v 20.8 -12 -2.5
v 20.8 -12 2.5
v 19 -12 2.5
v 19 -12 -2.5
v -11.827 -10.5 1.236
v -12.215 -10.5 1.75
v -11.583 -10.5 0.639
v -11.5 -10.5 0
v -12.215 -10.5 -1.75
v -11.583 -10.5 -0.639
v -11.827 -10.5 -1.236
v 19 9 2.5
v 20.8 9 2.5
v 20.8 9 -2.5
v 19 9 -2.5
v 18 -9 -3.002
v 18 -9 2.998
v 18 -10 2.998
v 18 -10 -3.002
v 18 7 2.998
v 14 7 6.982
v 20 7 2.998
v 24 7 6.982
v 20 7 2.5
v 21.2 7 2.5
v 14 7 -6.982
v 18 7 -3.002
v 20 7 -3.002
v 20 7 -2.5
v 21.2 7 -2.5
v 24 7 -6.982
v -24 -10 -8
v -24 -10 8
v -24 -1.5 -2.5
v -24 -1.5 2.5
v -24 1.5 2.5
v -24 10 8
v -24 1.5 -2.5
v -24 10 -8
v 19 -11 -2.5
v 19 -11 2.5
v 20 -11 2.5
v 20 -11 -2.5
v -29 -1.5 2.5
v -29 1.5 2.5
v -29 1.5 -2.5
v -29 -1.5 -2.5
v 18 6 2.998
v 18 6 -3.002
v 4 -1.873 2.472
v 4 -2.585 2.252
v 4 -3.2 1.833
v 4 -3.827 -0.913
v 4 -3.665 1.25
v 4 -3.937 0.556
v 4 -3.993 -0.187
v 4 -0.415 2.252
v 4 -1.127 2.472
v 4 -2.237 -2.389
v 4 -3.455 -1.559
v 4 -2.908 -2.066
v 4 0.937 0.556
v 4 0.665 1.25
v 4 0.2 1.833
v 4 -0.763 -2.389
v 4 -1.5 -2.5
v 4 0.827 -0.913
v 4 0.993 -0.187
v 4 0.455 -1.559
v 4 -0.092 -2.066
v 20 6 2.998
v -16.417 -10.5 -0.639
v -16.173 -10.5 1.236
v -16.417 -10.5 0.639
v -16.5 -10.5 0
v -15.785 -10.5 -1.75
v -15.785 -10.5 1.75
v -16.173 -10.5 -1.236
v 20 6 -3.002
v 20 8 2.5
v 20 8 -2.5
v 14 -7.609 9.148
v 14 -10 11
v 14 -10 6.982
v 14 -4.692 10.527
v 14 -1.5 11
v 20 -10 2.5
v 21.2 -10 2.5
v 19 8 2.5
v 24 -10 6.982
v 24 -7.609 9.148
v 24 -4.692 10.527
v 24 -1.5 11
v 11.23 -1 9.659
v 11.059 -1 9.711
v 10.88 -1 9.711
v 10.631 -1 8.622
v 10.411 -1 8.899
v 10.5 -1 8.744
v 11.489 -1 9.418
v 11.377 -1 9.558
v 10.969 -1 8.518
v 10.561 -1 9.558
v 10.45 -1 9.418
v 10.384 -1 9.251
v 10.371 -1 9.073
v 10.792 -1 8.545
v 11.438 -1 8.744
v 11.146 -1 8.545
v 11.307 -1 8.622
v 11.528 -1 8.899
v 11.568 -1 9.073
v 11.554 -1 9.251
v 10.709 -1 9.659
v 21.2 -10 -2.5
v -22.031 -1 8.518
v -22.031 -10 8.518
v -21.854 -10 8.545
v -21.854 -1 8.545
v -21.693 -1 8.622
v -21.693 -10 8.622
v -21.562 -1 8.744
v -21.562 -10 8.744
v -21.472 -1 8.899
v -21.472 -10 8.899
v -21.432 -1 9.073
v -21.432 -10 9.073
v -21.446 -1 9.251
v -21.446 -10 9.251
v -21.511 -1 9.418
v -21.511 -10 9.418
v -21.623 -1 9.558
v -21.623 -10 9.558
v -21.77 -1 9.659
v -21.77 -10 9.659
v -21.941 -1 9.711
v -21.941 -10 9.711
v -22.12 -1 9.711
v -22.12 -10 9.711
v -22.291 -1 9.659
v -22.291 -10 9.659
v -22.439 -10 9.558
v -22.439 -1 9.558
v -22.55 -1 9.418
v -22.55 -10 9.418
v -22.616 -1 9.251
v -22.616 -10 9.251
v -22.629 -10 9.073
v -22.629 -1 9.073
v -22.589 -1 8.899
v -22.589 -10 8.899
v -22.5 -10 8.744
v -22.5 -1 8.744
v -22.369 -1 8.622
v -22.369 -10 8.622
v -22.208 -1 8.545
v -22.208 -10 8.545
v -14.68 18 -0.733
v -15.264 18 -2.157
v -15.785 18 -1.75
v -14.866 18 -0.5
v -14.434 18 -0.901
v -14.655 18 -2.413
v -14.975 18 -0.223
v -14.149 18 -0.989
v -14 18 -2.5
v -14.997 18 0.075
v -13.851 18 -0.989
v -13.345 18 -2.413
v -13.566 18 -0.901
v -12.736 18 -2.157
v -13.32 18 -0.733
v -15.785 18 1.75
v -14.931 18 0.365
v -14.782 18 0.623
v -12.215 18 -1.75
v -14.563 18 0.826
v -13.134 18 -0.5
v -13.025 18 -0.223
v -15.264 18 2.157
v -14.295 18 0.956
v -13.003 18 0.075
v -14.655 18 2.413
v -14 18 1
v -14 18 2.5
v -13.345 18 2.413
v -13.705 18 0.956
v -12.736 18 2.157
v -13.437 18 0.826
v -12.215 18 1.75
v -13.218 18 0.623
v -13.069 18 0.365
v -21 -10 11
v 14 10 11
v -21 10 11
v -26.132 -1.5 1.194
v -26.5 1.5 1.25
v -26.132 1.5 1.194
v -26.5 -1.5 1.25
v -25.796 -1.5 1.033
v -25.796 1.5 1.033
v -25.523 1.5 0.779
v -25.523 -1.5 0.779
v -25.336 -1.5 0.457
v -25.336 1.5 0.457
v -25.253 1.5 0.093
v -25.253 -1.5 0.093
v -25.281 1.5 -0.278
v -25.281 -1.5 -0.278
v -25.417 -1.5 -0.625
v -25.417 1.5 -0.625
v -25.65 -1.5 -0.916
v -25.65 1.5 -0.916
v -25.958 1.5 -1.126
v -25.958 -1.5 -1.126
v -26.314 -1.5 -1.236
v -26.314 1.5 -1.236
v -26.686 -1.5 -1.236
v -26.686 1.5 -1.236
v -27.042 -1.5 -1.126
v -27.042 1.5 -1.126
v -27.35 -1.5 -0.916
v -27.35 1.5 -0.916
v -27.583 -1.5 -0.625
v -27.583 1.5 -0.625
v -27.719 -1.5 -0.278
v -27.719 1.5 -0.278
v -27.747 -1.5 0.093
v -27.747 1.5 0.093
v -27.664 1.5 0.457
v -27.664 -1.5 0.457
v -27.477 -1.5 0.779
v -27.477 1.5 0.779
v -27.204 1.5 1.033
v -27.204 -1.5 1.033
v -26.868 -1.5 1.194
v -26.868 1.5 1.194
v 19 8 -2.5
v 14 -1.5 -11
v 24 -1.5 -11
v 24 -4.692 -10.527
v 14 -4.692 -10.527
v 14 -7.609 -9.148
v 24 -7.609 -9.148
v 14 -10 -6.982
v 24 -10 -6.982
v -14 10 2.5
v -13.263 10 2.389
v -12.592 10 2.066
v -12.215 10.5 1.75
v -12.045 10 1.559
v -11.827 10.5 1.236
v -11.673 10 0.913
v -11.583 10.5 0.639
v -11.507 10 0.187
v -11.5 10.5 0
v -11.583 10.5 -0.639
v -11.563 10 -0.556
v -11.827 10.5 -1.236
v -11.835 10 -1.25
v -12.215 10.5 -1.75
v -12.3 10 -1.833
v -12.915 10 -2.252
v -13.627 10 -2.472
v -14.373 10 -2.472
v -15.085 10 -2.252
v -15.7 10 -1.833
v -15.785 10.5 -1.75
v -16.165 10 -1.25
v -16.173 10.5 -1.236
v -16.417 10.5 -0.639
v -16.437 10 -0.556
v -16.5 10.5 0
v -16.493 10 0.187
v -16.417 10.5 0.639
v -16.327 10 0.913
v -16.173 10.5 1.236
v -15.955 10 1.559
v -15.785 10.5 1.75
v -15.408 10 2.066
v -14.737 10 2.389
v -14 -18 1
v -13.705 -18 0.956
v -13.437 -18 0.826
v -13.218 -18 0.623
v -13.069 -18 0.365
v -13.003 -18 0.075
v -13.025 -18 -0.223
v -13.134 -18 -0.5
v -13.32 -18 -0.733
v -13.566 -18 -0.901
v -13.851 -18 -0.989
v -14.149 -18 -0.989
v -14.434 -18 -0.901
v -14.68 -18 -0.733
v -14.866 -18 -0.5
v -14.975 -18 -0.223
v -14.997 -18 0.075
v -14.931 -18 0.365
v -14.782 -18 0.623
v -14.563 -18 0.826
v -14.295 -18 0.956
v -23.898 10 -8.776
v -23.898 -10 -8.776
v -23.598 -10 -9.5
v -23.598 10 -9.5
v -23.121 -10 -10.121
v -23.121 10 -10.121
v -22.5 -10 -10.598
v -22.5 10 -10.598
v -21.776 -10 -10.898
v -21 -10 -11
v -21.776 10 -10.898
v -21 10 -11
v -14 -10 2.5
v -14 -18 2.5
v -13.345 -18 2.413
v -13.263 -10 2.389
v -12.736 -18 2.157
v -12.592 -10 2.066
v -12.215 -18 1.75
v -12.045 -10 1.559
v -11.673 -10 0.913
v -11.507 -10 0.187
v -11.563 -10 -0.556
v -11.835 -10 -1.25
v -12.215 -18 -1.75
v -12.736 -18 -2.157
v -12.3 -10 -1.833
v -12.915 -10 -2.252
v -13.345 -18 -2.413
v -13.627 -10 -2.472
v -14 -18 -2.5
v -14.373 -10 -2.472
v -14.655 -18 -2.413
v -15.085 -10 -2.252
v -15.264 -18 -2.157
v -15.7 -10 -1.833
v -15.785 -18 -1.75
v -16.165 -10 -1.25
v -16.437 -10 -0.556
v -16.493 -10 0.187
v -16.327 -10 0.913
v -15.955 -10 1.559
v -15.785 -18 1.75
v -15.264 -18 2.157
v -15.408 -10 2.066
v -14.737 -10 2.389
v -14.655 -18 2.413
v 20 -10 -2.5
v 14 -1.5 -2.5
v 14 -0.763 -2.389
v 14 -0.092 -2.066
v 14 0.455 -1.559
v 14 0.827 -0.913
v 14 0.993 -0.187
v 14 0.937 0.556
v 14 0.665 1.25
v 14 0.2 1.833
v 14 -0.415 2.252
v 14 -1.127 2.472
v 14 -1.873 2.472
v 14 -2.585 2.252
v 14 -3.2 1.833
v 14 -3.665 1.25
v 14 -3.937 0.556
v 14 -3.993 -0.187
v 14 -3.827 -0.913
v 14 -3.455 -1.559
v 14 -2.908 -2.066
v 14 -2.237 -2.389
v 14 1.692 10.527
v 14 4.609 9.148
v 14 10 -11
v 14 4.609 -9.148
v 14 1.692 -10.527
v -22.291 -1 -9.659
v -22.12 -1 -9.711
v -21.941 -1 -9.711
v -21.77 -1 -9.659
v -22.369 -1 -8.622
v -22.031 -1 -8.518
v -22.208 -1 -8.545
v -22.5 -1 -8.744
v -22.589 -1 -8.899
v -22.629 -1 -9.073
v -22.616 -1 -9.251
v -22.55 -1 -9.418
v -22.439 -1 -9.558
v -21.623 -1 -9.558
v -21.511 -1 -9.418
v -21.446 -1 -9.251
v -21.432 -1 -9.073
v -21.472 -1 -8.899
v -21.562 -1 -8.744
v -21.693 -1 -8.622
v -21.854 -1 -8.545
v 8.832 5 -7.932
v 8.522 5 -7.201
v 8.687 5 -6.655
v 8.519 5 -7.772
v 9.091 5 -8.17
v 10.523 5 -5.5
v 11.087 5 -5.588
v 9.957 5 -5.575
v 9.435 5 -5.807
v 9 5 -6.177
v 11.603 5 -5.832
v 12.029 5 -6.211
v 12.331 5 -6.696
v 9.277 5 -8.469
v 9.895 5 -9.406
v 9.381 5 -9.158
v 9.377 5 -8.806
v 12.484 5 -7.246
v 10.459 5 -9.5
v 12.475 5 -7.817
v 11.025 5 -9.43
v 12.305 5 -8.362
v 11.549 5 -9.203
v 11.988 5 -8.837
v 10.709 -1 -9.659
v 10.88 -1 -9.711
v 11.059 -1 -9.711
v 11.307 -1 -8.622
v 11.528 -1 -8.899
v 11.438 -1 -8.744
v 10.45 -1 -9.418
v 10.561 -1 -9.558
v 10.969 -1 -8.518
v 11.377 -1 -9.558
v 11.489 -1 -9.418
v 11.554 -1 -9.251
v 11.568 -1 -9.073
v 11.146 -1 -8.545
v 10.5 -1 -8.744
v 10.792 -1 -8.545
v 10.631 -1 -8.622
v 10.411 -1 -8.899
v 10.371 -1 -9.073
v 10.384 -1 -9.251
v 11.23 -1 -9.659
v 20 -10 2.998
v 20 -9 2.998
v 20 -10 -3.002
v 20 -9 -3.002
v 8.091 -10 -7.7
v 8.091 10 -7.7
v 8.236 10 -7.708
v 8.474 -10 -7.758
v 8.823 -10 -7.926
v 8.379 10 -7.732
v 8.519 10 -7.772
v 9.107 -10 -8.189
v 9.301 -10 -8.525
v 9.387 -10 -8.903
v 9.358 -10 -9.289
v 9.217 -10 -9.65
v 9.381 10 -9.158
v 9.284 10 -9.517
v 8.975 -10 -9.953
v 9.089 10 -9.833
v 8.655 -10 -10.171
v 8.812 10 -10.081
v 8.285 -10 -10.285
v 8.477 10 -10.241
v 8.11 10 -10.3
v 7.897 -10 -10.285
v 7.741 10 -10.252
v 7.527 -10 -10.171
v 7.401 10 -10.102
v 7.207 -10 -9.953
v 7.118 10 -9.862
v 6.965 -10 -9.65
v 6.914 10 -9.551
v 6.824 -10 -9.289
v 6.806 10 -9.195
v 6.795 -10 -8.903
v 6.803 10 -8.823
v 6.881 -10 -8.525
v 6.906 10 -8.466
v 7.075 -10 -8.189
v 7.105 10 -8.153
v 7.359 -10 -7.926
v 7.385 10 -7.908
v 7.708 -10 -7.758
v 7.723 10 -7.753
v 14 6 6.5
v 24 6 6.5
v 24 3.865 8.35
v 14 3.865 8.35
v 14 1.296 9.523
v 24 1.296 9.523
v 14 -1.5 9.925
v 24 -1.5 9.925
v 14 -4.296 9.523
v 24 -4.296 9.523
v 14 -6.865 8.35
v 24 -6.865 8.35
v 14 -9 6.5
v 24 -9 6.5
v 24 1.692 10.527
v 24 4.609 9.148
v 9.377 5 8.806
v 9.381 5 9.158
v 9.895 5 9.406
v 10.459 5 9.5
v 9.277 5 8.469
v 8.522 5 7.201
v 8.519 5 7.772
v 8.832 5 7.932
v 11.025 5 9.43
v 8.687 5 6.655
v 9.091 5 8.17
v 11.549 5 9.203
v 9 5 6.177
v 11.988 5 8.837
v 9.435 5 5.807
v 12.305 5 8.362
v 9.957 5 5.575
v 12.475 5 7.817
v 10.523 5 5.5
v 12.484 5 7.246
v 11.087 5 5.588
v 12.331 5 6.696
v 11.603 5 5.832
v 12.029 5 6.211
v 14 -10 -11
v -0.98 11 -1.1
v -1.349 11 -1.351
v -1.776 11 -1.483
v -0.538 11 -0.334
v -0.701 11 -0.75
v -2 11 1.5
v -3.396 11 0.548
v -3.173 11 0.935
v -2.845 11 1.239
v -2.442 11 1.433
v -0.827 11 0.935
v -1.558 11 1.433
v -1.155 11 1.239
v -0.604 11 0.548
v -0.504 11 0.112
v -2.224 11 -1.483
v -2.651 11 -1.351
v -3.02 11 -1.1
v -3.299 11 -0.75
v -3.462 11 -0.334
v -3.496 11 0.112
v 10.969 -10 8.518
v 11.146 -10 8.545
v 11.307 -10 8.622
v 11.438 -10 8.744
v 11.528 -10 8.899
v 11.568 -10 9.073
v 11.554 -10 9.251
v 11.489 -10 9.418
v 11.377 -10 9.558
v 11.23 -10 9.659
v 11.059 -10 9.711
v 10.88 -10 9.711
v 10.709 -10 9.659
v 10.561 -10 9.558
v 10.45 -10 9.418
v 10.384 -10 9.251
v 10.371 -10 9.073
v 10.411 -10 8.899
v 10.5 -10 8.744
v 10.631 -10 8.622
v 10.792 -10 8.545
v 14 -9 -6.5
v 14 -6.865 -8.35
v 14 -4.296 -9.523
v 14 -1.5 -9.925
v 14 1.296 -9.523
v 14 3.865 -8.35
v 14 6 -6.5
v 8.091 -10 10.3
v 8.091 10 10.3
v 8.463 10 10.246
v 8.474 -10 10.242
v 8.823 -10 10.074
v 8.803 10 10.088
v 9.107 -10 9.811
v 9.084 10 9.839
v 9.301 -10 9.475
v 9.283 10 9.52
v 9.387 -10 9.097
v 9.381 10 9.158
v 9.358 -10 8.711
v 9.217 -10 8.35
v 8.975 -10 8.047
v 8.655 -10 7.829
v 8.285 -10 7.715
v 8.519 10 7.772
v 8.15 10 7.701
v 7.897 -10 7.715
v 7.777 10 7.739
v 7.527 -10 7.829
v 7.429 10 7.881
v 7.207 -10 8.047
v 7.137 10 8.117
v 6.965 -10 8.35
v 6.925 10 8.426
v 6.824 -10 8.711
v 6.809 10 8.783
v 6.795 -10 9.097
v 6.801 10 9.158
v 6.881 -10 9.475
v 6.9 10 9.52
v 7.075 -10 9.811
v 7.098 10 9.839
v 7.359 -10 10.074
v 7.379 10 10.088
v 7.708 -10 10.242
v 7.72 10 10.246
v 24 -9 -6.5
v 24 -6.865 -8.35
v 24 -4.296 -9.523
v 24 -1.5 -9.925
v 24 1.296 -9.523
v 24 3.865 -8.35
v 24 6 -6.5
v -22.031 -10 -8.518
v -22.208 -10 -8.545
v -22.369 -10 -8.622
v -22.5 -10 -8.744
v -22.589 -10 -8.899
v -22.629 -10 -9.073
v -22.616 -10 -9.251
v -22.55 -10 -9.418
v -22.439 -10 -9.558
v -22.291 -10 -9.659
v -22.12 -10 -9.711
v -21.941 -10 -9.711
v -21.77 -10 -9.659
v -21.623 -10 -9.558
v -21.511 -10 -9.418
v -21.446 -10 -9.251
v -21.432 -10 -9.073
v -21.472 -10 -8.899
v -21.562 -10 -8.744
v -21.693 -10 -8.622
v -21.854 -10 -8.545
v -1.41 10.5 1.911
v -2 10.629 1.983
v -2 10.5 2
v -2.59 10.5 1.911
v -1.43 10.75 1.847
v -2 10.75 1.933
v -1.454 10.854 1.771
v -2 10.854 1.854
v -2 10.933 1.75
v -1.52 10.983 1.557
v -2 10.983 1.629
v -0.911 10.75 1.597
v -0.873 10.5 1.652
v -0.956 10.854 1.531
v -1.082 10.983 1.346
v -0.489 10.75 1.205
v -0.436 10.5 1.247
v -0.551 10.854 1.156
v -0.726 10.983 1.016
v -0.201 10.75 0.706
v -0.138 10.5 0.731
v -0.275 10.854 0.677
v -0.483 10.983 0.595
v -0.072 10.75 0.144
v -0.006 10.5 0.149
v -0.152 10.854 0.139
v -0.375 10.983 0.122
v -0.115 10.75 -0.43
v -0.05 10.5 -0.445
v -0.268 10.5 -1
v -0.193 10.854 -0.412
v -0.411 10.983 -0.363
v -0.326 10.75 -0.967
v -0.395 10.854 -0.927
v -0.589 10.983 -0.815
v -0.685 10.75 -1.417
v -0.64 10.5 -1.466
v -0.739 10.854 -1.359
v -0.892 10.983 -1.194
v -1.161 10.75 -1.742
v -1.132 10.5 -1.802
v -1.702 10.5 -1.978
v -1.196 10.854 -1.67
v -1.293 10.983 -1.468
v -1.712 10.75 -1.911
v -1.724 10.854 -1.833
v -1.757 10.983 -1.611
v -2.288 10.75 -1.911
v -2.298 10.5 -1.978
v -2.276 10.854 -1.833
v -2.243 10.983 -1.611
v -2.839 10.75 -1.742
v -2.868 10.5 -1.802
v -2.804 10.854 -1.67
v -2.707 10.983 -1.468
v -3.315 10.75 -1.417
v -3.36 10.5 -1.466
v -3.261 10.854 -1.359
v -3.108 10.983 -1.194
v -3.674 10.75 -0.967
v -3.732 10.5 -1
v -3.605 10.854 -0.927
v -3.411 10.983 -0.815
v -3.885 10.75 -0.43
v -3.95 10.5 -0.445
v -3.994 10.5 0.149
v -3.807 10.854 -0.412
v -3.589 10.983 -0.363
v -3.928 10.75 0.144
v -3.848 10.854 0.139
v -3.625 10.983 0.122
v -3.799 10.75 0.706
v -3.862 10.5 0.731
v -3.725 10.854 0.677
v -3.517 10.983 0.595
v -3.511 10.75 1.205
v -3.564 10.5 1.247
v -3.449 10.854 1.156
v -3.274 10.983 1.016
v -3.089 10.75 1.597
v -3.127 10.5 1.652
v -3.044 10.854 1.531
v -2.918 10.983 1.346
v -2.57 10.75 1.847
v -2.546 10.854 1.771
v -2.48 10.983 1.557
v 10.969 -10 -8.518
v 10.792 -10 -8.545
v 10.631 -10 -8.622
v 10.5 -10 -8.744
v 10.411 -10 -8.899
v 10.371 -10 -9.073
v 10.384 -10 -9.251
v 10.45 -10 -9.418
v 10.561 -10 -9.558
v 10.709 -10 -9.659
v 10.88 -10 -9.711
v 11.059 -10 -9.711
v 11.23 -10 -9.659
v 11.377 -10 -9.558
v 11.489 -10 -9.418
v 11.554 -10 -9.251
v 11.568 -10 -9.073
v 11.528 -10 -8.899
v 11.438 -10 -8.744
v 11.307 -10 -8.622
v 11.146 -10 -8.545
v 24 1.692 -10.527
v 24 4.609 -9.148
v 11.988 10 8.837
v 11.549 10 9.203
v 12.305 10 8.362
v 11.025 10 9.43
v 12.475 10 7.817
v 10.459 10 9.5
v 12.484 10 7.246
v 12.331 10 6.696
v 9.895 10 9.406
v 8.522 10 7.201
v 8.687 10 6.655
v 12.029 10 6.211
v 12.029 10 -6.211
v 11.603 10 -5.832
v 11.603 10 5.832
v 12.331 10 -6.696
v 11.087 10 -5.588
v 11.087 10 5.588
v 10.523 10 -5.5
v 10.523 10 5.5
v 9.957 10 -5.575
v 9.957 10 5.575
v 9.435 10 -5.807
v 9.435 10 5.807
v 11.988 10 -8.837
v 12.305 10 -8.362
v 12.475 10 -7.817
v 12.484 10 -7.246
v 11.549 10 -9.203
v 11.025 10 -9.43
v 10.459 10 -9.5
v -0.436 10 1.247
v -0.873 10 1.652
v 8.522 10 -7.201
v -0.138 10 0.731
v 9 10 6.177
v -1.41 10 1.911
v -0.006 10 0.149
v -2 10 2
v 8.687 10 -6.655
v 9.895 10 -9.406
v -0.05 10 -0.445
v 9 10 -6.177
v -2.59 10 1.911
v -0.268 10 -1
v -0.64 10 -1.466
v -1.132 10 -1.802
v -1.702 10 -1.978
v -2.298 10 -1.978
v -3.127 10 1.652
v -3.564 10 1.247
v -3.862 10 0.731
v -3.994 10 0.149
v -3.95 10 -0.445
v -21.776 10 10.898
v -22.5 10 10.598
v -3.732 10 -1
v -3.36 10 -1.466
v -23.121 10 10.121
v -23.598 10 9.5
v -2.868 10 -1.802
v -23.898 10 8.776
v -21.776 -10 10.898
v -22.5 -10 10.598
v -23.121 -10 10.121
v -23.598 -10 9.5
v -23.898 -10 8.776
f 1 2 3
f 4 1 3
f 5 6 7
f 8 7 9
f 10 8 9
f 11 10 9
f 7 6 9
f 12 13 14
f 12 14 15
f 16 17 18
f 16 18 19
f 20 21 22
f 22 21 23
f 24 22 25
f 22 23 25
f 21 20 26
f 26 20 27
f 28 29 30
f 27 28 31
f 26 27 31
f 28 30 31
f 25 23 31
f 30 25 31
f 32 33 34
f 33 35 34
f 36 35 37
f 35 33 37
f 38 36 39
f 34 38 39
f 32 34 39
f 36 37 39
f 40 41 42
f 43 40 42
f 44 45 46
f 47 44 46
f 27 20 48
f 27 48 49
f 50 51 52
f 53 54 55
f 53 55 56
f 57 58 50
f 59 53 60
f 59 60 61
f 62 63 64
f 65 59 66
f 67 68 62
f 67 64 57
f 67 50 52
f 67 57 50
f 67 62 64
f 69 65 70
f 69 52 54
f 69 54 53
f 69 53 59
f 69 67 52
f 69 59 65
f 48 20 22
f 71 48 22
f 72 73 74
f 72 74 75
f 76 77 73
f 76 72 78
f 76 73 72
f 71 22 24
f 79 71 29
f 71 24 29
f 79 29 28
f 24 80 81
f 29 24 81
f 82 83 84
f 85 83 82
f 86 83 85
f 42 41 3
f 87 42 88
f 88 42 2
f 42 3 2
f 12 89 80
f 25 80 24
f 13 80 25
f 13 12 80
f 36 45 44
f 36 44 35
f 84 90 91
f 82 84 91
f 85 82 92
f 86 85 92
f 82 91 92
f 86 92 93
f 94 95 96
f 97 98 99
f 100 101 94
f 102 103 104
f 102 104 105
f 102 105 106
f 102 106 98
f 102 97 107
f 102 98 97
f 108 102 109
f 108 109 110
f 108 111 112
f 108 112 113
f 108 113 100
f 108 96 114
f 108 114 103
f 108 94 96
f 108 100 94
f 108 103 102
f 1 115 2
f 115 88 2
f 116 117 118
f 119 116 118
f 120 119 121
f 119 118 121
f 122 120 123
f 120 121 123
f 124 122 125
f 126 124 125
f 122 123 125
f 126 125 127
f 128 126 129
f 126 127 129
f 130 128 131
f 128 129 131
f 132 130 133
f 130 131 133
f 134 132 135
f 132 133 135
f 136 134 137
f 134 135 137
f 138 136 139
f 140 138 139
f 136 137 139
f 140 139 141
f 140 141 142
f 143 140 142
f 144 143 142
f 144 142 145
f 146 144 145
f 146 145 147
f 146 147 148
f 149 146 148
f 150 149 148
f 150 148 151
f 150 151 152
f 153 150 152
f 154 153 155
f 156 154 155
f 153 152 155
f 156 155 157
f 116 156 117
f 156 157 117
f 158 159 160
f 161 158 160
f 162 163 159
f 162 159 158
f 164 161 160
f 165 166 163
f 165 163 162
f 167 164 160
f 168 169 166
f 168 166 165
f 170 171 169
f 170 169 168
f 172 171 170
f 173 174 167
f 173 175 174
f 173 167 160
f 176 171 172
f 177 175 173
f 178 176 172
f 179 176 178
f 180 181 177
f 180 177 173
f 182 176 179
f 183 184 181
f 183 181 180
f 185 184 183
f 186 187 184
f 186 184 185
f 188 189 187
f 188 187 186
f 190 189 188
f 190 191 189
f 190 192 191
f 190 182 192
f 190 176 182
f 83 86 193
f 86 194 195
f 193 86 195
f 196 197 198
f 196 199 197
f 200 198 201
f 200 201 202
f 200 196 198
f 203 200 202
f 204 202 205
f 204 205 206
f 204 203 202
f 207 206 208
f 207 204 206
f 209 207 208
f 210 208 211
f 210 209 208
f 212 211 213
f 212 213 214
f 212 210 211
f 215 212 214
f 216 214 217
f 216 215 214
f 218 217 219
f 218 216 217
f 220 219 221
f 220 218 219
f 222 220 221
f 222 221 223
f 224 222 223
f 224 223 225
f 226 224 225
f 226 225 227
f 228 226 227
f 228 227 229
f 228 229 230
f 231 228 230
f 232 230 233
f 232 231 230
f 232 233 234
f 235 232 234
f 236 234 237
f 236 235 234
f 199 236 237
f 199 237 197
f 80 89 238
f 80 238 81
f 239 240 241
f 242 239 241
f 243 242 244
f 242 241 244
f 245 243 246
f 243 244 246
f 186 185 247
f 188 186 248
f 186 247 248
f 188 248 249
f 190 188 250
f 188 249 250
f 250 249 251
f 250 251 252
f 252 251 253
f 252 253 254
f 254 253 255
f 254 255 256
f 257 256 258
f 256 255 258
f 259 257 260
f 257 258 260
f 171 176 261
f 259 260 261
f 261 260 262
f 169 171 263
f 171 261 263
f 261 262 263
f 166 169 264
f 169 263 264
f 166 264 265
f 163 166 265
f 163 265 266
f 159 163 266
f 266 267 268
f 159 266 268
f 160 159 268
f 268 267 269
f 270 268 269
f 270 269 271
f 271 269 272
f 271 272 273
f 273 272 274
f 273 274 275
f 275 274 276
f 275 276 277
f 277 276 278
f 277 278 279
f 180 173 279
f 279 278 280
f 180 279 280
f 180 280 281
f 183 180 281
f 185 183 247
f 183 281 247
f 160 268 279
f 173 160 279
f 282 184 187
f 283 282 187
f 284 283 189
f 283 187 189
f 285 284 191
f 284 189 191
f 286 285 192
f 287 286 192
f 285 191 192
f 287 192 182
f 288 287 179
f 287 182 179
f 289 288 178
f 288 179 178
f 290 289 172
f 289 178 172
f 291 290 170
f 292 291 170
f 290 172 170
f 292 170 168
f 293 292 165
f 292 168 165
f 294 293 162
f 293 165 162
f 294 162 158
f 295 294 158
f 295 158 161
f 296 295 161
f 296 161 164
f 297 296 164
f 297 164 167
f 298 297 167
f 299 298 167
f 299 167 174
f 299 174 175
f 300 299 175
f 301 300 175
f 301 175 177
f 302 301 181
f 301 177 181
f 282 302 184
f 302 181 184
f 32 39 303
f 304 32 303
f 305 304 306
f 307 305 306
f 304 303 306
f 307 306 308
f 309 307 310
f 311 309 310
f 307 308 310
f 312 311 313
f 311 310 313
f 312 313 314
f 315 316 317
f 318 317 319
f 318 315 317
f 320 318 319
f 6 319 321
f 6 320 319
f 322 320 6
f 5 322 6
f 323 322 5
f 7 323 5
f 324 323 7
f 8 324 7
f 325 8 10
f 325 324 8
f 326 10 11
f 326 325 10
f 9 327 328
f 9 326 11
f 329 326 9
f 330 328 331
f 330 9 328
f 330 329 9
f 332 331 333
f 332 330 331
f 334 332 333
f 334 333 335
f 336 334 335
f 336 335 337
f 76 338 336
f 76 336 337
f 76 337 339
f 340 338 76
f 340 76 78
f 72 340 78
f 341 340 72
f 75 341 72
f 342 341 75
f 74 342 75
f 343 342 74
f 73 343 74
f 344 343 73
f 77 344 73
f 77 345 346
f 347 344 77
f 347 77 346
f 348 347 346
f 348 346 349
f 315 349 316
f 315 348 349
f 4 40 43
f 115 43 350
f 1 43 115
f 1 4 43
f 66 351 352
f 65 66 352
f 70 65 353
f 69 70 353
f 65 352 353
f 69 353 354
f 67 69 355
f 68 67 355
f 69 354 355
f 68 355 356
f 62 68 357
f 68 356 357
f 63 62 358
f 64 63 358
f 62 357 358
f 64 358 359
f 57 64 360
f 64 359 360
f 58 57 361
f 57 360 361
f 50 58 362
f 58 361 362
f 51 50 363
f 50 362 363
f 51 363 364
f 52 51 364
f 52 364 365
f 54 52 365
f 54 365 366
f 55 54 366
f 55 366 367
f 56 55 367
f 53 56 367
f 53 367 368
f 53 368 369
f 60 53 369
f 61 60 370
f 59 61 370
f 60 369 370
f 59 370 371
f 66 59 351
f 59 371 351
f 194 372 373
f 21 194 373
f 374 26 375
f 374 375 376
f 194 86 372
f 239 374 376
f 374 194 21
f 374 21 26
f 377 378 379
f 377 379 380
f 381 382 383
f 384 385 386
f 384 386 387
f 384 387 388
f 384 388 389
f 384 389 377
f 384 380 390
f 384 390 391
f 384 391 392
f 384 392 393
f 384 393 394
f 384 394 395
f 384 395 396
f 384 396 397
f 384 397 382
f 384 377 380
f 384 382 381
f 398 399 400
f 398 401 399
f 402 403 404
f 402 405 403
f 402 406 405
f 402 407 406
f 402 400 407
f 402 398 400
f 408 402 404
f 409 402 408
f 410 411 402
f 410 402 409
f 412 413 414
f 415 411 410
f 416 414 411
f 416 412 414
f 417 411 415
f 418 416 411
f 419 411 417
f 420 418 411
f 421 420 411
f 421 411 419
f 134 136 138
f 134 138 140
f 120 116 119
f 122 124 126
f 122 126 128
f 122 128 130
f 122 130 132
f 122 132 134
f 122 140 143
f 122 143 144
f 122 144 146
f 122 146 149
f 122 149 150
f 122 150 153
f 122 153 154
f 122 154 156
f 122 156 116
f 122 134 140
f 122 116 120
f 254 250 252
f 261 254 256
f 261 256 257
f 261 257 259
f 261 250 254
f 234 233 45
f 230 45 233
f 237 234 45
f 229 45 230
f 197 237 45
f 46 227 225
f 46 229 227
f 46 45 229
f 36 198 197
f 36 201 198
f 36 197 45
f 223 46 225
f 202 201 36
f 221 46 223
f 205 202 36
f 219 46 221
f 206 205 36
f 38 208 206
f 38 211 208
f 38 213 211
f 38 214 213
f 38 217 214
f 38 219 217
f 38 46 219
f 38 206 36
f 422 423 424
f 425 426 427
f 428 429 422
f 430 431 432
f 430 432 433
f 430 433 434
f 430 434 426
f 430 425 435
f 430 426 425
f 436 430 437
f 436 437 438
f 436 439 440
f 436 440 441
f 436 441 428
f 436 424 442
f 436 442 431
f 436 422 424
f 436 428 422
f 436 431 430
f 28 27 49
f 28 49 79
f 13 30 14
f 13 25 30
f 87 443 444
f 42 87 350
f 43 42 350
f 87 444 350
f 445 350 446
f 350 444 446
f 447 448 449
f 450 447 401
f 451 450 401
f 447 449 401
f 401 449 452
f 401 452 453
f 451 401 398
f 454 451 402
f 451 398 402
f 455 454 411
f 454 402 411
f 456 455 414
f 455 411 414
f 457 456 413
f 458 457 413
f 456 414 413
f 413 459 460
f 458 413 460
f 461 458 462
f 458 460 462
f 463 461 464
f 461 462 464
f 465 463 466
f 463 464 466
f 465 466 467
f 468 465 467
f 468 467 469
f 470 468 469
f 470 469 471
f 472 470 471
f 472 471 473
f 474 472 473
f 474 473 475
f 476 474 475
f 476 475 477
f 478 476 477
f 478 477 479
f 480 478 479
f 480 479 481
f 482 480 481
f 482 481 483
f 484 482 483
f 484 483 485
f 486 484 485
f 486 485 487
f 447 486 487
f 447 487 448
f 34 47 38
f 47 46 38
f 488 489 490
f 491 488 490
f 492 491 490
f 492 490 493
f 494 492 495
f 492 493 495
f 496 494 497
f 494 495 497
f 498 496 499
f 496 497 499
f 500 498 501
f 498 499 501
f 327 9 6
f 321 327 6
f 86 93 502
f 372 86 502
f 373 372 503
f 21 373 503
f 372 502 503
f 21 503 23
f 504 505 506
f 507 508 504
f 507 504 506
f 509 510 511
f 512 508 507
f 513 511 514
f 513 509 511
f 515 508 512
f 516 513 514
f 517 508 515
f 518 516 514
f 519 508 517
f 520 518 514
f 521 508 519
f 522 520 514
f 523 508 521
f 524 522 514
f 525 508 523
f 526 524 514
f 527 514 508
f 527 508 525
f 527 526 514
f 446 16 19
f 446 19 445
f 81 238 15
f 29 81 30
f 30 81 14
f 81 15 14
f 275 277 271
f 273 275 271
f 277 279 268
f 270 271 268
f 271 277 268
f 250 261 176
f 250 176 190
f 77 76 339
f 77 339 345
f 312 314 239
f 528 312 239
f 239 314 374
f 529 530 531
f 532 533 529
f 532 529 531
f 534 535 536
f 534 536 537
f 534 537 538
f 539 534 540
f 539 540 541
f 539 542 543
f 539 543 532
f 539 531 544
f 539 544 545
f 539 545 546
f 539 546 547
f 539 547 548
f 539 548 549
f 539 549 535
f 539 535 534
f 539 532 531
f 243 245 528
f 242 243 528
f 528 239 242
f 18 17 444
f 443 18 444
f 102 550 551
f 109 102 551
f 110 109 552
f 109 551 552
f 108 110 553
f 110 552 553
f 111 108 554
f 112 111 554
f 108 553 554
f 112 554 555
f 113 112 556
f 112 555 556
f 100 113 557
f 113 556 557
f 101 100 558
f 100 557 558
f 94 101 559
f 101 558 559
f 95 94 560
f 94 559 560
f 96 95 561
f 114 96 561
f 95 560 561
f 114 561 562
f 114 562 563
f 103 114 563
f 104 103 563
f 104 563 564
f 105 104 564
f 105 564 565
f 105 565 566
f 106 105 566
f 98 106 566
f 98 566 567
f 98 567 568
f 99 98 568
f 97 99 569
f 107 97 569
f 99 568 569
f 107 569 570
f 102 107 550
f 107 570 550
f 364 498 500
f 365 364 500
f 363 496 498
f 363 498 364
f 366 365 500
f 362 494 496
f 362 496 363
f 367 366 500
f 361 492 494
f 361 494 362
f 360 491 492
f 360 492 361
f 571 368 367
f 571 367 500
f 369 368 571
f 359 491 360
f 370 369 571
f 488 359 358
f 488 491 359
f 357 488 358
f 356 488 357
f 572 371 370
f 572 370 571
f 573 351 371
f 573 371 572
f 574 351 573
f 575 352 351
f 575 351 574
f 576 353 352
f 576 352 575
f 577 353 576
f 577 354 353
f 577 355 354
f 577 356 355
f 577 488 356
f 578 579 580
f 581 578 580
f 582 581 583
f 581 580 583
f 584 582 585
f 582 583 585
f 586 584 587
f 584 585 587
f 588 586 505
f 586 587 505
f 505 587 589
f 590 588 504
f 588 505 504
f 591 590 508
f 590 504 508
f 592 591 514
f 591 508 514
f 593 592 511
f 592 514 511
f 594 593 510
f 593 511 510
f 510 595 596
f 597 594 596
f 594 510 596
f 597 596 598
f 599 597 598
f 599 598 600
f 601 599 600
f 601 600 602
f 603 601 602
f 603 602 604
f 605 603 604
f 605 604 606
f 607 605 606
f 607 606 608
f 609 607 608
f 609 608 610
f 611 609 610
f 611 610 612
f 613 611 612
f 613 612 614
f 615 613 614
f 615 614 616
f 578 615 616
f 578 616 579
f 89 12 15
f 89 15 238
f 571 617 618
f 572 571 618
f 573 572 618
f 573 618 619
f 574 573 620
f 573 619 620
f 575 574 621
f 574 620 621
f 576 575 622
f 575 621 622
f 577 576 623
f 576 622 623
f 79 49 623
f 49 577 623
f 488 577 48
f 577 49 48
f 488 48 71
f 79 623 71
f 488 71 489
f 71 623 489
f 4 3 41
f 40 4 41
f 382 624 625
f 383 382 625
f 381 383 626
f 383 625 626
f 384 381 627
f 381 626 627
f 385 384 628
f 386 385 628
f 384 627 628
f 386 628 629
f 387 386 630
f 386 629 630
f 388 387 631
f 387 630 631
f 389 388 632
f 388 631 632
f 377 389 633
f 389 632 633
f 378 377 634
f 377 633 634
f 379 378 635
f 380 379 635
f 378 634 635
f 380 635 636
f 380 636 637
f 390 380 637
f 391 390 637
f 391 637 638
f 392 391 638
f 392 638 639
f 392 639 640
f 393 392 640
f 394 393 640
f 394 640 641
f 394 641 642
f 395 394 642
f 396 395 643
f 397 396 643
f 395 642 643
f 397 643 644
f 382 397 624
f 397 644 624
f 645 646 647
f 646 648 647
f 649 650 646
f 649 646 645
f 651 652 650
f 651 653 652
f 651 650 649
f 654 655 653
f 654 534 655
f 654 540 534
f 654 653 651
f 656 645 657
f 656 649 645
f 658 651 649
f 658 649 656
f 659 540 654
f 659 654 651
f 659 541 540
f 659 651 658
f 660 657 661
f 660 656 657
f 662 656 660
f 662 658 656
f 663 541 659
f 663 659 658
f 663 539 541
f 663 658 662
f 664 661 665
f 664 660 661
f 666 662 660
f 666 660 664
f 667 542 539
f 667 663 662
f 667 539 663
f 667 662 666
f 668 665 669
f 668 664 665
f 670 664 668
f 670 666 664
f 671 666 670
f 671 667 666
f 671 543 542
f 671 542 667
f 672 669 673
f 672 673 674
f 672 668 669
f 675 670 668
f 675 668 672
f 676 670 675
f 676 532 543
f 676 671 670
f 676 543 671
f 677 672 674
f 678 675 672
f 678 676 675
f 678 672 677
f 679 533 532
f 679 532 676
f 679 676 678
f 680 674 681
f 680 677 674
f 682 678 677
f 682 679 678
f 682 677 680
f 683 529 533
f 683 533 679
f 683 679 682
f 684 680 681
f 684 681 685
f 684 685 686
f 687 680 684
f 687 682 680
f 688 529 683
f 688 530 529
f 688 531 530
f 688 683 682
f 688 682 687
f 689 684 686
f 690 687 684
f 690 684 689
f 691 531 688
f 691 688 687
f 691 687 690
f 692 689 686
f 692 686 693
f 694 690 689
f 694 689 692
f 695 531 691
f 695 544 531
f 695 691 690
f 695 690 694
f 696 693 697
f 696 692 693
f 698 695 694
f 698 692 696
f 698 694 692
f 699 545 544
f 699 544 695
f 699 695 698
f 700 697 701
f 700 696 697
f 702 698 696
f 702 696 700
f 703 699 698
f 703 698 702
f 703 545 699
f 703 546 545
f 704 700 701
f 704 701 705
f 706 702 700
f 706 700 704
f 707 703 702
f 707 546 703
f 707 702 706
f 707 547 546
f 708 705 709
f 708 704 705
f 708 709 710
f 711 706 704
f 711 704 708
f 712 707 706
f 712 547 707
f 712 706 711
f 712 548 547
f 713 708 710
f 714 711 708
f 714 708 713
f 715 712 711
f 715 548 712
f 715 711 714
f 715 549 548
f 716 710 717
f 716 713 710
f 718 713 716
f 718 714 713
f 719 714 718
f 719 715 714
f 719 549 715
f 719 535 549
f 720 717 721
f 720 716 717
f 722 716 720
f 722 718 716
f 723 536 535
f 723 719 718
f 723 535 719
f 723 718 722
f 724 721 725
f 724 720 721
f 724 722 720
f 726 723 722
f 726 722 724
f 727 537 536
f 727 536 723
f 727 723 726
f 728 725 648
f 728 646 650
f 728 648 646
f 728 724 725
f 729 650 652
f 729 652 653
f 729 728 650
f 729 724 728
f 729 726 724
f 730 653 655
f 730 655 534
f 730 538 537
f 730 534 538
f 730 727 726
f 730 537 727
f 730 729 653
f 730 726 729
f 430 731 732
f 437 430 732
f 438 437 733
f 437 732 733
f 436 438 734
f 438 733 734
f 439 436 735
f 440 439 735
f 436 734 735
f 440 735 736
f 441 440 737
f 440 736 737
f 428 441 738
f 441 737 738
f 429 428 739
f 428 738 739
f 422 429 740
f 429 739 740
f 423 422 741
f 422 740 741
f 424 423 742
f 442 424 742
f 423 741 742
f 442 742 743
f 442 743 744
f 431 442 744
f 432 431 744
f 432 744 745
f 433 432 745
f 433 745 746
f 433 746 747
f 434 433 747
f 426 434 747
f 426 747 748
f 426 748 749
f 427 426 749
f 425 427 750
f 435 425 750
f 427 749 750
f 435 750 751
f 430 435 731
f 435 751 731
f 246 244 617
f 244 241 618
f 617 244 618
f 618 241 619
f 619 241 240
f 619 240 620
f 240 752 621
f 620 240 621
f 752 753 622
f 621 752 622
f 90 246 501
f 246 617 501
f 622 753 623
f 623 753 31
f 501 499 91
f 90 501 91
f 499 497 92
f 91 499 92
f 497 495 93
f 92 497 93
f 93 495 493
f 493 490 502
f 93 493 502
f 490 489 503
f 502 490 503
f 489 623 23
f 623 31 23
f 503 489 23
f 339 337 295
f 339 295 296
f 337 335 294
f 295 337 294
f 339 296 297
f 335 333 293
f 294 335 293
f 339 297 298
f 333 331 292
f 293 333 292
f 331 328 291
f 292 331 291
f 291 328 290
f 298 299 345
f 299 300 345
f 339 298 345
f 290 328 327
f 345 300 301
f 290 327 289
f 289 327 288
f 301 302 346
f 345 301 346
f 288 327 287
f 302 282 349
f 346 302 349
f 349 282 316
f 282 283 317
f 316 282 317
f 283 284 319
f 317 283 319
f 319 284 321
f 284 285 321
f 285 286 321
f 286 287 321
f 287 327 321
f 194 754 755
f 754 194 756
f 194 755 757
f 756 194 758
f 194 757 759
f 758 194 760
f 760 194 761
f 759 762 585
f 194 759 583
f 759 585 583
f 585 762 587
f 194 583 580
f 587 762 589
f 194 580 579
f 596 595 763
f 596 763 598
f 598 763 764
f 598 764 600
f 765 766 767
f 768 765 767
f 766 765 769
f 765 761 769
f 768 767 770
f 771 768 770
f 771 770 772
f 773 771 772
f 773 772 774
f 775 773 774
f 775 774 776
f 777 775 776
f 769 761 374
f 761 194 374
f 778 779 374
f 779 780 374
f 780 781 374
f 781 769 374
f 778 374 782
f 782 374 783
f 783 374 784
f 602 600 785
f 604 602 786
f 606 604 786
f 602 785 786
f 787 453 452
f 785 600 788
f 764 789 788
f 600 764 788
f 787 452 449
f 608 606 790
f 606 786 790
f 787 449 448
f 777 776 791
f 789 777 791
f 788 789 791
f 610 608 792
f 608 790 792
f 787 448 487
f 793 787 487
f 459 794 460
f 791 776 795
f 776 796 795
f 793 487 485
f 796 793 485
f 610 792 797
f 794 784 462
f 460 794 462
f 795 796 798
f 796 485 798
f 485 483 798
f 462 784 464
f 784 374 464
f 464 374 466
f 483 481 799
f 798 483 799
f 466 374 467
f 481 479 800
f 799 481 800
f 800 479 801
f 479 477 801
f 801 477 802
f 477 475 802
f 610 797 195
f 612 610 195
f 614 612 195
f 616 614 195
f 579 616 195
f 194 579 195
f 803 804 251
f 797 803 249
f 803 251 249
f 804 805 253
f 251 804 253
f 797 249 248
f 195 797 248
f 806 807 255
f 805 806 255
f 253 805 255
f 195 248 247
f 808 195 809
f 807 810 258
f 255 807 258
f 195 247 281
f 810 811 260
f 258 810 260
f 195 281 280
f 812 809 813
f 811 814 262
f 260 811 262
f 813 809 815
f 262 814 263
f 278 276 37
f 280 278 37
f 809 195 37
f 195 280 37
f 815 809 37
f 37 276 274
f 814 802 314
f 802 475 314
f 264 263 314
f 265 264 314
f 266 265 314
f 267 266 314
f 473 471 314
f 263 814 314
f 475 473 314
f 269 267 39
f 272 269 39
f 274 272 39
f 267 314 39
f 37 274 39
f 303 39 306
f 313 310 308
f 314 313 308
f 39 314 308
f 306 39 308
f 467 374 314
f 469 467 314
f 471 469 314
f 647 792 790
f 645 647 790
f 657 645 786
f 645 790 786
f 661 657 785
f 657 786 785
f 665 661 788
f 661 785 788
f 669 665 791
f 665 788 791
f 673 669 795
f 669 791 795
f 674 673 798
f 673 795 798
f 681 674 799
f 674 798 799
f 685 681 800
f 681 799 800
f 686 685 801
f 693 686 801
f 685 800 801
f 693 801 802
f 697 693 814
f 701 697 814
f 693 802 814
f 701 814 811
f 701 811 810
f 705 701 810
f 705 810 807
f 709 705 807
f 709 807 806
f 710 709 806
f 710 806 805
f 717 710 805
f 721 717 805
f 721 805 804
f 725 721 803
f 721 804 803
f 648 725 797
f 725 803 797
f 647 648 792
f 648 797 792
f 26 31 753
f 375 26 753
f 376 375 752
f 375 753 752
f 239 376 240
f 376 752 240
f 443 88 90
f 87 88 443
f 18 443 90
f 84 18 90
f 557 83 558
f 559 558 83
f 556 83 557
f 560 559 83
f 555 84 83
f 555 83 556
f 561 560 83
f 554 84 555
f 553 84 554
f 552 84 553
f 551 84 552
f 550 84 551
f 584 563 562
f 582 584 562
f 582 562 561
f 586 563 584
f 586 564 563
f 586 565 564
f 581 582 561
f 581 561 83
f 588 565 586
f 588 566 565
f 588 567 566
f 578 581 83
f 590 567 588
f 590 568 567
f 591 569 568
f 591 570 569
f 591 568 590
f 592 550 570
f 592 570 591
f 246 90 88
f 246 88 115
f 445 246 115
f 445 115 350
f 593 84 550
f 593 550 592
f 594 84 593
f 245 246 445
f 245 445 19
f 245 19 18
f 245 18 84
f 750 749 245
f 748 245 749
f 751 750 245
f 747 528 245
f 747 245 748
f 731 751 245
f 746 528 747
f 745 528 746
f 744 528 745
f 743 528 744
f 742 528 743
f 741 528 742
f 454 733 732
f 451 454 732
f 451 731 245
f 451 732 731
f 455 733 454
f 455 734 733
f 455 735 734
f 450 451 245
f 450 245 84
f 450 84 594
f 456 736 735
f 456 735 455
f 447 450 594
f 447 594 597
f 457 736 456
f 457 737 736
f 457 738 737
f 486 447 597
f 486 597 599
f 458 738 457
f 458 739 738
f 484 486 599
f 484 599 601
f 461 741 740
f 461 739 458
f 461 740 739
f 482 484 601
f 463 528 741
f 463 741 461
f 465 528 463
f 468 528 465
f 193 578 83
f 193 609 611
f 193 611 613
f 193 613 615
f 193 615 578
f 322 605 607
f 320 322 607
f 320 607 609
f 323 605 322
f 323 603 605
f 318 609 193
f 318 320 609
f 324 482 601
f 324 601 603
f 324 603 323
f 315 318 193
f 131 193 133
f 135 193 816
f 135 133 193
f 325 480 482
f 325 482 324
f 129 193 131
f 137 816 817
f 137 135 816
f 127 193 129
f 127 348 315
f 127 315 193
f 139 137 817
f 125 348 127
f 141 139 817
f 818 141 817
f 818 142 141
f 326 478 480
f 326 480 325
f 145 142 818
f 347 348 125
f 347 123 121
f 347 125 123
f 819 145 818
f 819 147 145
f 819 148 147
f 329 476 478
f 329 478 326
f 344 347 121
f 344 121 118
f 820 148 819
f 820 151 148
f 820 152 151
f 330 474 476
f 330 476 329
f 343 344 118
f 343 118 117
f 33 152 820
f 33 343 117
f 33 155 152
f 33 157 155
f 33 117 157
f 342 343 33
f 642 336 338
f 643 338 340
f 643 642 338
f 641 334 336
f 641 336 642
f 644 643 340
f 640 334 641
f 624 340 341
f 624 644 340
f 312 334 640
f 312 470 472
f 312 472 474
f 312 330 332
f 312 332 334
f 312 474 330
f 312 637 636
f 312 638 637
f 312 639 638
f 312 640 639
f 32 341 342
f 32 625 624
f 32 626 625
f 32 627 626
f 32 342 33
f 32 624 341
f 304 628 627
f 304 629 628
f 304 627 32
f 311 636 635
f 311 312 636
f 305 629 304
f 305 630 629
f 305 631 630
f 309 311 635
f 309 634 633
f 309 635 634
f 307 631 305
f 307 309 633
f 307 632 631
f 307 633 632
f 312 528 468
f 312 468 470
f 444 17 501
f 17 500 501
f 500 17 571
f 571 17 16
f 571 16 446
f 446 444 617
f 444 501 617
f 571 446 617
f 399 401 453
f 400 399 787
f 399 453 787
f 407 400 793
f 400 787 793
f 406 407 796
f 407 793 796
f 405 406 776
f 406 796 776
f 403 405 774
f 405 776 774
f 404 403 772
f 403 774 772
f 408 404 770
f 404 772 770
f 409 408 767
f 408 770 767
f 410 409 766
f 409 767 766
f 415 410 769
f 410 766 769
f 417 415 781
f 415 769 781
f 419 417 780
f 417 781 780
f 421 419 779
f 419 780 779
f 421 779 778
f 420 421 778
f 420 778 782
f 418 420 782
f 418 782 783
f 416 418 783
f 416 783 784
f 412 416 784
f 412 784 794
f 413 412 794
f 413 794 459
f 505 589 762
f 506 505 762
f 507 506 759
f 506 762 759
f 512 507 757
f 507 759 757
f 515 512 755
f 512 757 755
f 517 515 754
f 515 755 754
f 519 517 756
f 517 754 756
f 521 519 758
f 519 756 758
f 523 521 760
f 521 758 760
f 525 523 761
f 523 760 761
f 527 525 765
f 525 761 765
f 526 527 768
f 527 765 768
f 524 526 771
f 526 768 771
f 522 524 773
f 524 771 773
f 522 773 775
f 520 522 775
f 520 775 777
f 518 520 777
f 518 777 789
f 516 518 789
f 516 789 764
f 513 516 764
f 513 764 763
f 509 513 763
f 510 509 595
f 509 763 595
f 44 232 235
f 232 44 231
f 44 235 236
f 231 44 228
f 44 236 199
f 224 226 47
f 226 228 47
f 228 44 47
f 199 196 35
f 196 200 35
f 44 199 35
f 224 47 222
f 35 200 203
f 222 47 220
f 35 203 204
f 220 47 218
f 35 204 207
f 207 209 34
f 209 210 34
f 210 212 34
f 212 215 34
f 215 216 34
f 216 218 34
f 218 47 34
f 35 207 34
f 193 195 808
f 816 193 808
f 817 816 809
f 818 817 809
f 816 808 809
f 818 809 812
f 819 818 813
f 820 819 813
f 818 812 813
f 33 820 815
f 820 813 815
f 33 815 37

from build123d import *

# Parameters (mm, degrees)
SALIENTE_EXTRUIR1_DEPTH = 10
CROQUIS1_3_W            = 5
CROQUIS1_3_H            = 5
CROQUIS1_3_R            = 1.25
SALIENTE_EXTRUIR2_DEPTH = 1.5
CROQUIS5_R              = 2.5
SALIENTE_EXTRUIR3_DEPTH = 8
CORTAR_EXTRUIR7_START   = -7.5
CORTAR_EXTRUIR7_DEPTH   = 7.5
CROQUIS7_R              = 1
CORTAR_EXTRUIR8_DEPTH   = 36
CORTAR_EXTRUIR18_DEPTH  = 10
CROQUIS9_R              = 1.3
CORTAR_EXTRUIR16_DEPTH  = 36
CROQUIS11_R             = 2
SALIENTE_EXTRUIR4_DEPTH = 1
REDONDEO1_R             = 0.5
CROQUIS12_R             = 0.6
CORTAR_EXTRUIR17_DEPTH  = 9
CROQUIS15_R             = 2
CORTAR_EXTRUIR21_DEPTH  = 5
CROQUIS16_R             = 2.5
CORTAR_EXTRUIR22_DEPTH  = 10
CROQUIS17_W             = 2
CROQUIS17_H             = 6
CORTAR_EXTRUIR23_DEPTH  = 20
SALIENTE_EXTRUIR5_DEPTH = 2.5


with BuildPart() as part:
    # Croquis1 → Saliente-Extruir1 (new, symmetric)
    with BuildSketch(Plane(origin=(0, 0, 0), x_dir=(1, 0, 0), z_dir=(0, 1, 0))):
        with BuildLine():
            ThreePointArc((-24, 8), (-23.121320344, 10.121320344), (-21, 11))
            Line((-21, 11), (24, 11))
            Line((24, 11), (24, -11))
            Line((24, -11), (-21, -11))
            ThreePointArc((-21, -11), (-23.121320344, -10.121320344), (-24, -8))
            Line((-24, -8), (-24, -2.5))
            Line((-24, -2.5), (-24, 2.5))
            Line((-24, 2.5), (-24, 8))
        make_face()
    extrude(amount=SALIENTE_EXTRUIR1_DEPTH, both=True)

    # Croquis1<3> → Saliente-Extruir2 (add, symmetric)
    with BuildSketch(Plane(origin=(0, 0, 0), x_dir=(1, 0, 0), z_dir=(0, 1, 0))):
        with Locations((-26.5, 0)):
            Rectangle(CROQUIS1_3_W, CROQUIS1_3_H)
        with Locations(Location((-26.5, 0, 0), (0, 0, 270))):
            Circle(CROQUIS1_3_R, mode=Mode.SUBTRACT)
    extrude(amount=SALIENTE_EXTRUIR2_DEPTH, both=True)

    # Croquis5 → Saliente-Extruir3 (add)
    with BuildSketch(Plane(origin=(0, 10, 0), x_dir=(1, 0, 0), z_dir=(0, 1, 0))):
        with Locations(Location((-14, 0, 0), (0, 0, 270))):
            Circle(CROQUIS5_R)
    saliente_extruir3 = extrude(amount=SALIENTE_EXTRUIR3_DEPTH)

    # Croquis6 → Cortar-Extruir7 (cut)
    with BuildSketch(Plane(origin=(0, 18, 0), x_dir=(1, 0, 0), z_dir=(0, 1, 0)).offset(CORTAR_EXTRUIR7_START)):
        with BuildLine():
            Line((-15.785357107, 1.75), (-15.785357107, -1.75))
            ThreePointArc((-15.785357107, -1.75), (-16.5, 0), (-15.785357107, 1.75))
        make_face()
        with BuildLine():
            Line((-12.214642893, 1.75), (-12.214642893, -1.75))
            ThreePointArc((-12.214642893, -1.75), (-11.5, 0), (-12.214642893, 1.75))
        make_face()
    cortar_extruir7 = extrude(amount=CORTAR_EXTRUIR7_DEPTH, mode=Mode.SUBTRACT)

    # Simetría2: Saliente-Extruir3, Cortar-Extruir7 across plane
    add(saliente_extruir3.mirror(Plane.ZX))
    add(cortar_extruir7.mirror(Plane.ZX), mode=Mode.SUBTRACT)

    # Croquis7 → Cortar-Extruir8 (cut)
    with BuildSketch(Plane(origin=(0, 18, 0), x_dir=(1, 0, 0), z_dir=(0, 1, 0))):
        with Locations(Location((-14, 0, 0), (0, 0, 270))):
            Circle(CROQUIS7_R)
    extrude(amount=-CORTAR_EXTRUIR8_DEPTH, mode=Mode.SUBTRACT)

    # Croquis13 → Cortar-Extruir18 (cut)
    with BuildSketch(Plane(origin=(24, 0, 0), x_dir=(0, 0, -1), z_dir=(1, 0, 0))):
        with BuildLine():
            Line((-11, 10), (-11, -1.5))
            ThreePointArc((-11, -1.5), (-9.944931378, 3.200887138), (-6.982120022, 7))
            Line((-6.982120022, 7), (6.982120022, 7))
            ThreePointArc((6.982120022, 7), (9.944931392, 3.200887108), (11, -1.500000065))
            Line((11, -1.500000065), (11, 10))
            Line((11, 10), (-11, 10))
        make_face()
        with BuildLine():
            ThreePointArc((11, -1.500000065), (9.944931364, -6.200887167), (6.982120022, -10))
            Line((6.982120022, -10), (11, -10))
            Line((11, -10), (11, -1.500000065))
        make_face()
        with BuildLine():
            Line((0, 6), (-6.5, 6))
            ThreePointArc((-6.5, 6), (-9.924716621, -1.5), (-6.5, -9))
            Line((-6.5, -9), (0, -9))
            Line((0, -9), (0, 6))
        make_face()
        with BuildLine():
            Line((6.5, 6), (0, 6))
            Line((0, 6), (0, -9))
            Line((0, -9), (6.5, -9))
            ThreePointArc((6.5, -9), (9.924716621, -1.5), (6.5, 6))
        make_face()
        with BuildLine():
            Line((-11, -10), (-6.982120022, -10))
            ThreePointArc((-6.982120022, -10), (-9.944931378, -6.200887138), (-11, -1.5))
            Line((-11, -1.5), (-11, -10))
        make_face()
    extrude(amount=-CORTAR_EXTRUIR18_DEPTH, mode=Mode.SUBTRACT)

    # Croquis9 → Cortar-Extruir16 (cut)
    with BuildSketch(Plane(origin=(0, 10, 0), x_dir=(1, 0, 0), z_dir=(0, 1, 0))):
        with Locations(Location((8.091085786, 9, 0), (0, 0, 270))):
            Circle(CROQUIS9_R)
        with Locations(Location((8.091085786, -9, 0), (0, 0, 270))):
            Circle(CROQUIS9_R)
    extrude(amount=-CORTAR_EXTRUIR16_DEPTH, mode=Mode.SUBTRACT)

    # Croquis11 → Saliente-Extruir4 (add)
    with BuildSketch(Plane(origin=(0, 10, 0), x_dir=(1, 0, 0), z_dir=(0, 1, 0))):
        with Locations(Location((-2, 0, 0), (0, 0, 270))):
            Circle(CROQUIS11_R)
    extrude(amount=SALIENTE_EXTRUIR4_DEPTH)

    # Redondeo1
    redondeo1_edges = [part.edges().sort_by_distance(p)[0] for p in [
        (-2, 11, -2),
    ]]
    fillet(redondeo1_edges, radius=REDONDEO1_R)

    # Croquis12 → Cortar-Extruir17 (cut)
    with BuildSketch(Plane.XZ.offset(10)):
        with Locations(Location((-22.030762345, 9.117944486, 0), (0, 0, 270))):
            Circle(CROQUIS12_R)
        with Locations(Location((10.969237655, 9.117944486, 0), (0, 0, 270))):
            Circle(CROQUIS12_R)
        with Locations(Location((10.969237655, -9.117944486, 0), (0, 0, 90))):
            Circle(CROQUIS12_R)
        with Locations(Location((-22.030762345, -9.117944486, 0), (0, 0, 90))):
            Circle(CROQUIS12_R)
    extrude(amount=-CORTAR_EXTRUIR17_DEPTH, mode=Mode.SUBTRACT)

    # Croquis15 → Cortar-Extruir21 (cut)
    with BuildSketch(Plane(origin=(0, 10, 0), x_dir=(1, 0, 0), z_dir=(0, 1, 0))):
        with Locations((10.5, 7.5)):
            Circle(CROQUIS15_R)
        with Locations((10.5, -7.5)):
            Circle(CROQUIS15_R)
    extrude(amount=-CORTAR_EXTRUIR21_DEPTH, mode=Mode.SUBTRACT)

    # Croquis16 → Cortar-Extruir22 (cut)
    with BuildSketch(Plane(origin=(14, 0, 0), x_dir=(0, 0, -1), z_dir=(1, 0, 0))):
        with Locations((0, -1.5)):
            Circle(CROQUIS16_R)
    extrude(amount=-CORTAR_EXTRUIR22_DEPTH, mode=Mode.SUBTRACT)

    # Croquis17 → Cortar-Extruir23 (cut)
    with BuildSketch(Plane(origin=(0, 7, 0), x_dir=(1, 0, 0), z_dir=(0, 1, 0))):
        with Locations((19, 0.002120022)):
            Rectangle(CROQUIS17_W, CROQUIS17_H)
    extrude(amount=-CORTAR_EXTRUIR23_DEPTH, mode=Mode.SUBTRACT)

    # Croquis18 → Saliente-Extruir5 (add, symmetric)
    with BuildSketch(Plane.XY):
        Polygon((21.2, 7), (20.8, 9), (19, 9), (19, 8), (20, 8), (20, 7), align=None)
    saliente_extruir5 = extrude(amount=SALIENTE_EXTRUIR5_DEPTH, both=True)

    # Simetría3: Saliente-Extruir5 across plane
    add(saliente_extruir5.mirror(Plane.ZX.offset(-1.5)))


solid = part.part
